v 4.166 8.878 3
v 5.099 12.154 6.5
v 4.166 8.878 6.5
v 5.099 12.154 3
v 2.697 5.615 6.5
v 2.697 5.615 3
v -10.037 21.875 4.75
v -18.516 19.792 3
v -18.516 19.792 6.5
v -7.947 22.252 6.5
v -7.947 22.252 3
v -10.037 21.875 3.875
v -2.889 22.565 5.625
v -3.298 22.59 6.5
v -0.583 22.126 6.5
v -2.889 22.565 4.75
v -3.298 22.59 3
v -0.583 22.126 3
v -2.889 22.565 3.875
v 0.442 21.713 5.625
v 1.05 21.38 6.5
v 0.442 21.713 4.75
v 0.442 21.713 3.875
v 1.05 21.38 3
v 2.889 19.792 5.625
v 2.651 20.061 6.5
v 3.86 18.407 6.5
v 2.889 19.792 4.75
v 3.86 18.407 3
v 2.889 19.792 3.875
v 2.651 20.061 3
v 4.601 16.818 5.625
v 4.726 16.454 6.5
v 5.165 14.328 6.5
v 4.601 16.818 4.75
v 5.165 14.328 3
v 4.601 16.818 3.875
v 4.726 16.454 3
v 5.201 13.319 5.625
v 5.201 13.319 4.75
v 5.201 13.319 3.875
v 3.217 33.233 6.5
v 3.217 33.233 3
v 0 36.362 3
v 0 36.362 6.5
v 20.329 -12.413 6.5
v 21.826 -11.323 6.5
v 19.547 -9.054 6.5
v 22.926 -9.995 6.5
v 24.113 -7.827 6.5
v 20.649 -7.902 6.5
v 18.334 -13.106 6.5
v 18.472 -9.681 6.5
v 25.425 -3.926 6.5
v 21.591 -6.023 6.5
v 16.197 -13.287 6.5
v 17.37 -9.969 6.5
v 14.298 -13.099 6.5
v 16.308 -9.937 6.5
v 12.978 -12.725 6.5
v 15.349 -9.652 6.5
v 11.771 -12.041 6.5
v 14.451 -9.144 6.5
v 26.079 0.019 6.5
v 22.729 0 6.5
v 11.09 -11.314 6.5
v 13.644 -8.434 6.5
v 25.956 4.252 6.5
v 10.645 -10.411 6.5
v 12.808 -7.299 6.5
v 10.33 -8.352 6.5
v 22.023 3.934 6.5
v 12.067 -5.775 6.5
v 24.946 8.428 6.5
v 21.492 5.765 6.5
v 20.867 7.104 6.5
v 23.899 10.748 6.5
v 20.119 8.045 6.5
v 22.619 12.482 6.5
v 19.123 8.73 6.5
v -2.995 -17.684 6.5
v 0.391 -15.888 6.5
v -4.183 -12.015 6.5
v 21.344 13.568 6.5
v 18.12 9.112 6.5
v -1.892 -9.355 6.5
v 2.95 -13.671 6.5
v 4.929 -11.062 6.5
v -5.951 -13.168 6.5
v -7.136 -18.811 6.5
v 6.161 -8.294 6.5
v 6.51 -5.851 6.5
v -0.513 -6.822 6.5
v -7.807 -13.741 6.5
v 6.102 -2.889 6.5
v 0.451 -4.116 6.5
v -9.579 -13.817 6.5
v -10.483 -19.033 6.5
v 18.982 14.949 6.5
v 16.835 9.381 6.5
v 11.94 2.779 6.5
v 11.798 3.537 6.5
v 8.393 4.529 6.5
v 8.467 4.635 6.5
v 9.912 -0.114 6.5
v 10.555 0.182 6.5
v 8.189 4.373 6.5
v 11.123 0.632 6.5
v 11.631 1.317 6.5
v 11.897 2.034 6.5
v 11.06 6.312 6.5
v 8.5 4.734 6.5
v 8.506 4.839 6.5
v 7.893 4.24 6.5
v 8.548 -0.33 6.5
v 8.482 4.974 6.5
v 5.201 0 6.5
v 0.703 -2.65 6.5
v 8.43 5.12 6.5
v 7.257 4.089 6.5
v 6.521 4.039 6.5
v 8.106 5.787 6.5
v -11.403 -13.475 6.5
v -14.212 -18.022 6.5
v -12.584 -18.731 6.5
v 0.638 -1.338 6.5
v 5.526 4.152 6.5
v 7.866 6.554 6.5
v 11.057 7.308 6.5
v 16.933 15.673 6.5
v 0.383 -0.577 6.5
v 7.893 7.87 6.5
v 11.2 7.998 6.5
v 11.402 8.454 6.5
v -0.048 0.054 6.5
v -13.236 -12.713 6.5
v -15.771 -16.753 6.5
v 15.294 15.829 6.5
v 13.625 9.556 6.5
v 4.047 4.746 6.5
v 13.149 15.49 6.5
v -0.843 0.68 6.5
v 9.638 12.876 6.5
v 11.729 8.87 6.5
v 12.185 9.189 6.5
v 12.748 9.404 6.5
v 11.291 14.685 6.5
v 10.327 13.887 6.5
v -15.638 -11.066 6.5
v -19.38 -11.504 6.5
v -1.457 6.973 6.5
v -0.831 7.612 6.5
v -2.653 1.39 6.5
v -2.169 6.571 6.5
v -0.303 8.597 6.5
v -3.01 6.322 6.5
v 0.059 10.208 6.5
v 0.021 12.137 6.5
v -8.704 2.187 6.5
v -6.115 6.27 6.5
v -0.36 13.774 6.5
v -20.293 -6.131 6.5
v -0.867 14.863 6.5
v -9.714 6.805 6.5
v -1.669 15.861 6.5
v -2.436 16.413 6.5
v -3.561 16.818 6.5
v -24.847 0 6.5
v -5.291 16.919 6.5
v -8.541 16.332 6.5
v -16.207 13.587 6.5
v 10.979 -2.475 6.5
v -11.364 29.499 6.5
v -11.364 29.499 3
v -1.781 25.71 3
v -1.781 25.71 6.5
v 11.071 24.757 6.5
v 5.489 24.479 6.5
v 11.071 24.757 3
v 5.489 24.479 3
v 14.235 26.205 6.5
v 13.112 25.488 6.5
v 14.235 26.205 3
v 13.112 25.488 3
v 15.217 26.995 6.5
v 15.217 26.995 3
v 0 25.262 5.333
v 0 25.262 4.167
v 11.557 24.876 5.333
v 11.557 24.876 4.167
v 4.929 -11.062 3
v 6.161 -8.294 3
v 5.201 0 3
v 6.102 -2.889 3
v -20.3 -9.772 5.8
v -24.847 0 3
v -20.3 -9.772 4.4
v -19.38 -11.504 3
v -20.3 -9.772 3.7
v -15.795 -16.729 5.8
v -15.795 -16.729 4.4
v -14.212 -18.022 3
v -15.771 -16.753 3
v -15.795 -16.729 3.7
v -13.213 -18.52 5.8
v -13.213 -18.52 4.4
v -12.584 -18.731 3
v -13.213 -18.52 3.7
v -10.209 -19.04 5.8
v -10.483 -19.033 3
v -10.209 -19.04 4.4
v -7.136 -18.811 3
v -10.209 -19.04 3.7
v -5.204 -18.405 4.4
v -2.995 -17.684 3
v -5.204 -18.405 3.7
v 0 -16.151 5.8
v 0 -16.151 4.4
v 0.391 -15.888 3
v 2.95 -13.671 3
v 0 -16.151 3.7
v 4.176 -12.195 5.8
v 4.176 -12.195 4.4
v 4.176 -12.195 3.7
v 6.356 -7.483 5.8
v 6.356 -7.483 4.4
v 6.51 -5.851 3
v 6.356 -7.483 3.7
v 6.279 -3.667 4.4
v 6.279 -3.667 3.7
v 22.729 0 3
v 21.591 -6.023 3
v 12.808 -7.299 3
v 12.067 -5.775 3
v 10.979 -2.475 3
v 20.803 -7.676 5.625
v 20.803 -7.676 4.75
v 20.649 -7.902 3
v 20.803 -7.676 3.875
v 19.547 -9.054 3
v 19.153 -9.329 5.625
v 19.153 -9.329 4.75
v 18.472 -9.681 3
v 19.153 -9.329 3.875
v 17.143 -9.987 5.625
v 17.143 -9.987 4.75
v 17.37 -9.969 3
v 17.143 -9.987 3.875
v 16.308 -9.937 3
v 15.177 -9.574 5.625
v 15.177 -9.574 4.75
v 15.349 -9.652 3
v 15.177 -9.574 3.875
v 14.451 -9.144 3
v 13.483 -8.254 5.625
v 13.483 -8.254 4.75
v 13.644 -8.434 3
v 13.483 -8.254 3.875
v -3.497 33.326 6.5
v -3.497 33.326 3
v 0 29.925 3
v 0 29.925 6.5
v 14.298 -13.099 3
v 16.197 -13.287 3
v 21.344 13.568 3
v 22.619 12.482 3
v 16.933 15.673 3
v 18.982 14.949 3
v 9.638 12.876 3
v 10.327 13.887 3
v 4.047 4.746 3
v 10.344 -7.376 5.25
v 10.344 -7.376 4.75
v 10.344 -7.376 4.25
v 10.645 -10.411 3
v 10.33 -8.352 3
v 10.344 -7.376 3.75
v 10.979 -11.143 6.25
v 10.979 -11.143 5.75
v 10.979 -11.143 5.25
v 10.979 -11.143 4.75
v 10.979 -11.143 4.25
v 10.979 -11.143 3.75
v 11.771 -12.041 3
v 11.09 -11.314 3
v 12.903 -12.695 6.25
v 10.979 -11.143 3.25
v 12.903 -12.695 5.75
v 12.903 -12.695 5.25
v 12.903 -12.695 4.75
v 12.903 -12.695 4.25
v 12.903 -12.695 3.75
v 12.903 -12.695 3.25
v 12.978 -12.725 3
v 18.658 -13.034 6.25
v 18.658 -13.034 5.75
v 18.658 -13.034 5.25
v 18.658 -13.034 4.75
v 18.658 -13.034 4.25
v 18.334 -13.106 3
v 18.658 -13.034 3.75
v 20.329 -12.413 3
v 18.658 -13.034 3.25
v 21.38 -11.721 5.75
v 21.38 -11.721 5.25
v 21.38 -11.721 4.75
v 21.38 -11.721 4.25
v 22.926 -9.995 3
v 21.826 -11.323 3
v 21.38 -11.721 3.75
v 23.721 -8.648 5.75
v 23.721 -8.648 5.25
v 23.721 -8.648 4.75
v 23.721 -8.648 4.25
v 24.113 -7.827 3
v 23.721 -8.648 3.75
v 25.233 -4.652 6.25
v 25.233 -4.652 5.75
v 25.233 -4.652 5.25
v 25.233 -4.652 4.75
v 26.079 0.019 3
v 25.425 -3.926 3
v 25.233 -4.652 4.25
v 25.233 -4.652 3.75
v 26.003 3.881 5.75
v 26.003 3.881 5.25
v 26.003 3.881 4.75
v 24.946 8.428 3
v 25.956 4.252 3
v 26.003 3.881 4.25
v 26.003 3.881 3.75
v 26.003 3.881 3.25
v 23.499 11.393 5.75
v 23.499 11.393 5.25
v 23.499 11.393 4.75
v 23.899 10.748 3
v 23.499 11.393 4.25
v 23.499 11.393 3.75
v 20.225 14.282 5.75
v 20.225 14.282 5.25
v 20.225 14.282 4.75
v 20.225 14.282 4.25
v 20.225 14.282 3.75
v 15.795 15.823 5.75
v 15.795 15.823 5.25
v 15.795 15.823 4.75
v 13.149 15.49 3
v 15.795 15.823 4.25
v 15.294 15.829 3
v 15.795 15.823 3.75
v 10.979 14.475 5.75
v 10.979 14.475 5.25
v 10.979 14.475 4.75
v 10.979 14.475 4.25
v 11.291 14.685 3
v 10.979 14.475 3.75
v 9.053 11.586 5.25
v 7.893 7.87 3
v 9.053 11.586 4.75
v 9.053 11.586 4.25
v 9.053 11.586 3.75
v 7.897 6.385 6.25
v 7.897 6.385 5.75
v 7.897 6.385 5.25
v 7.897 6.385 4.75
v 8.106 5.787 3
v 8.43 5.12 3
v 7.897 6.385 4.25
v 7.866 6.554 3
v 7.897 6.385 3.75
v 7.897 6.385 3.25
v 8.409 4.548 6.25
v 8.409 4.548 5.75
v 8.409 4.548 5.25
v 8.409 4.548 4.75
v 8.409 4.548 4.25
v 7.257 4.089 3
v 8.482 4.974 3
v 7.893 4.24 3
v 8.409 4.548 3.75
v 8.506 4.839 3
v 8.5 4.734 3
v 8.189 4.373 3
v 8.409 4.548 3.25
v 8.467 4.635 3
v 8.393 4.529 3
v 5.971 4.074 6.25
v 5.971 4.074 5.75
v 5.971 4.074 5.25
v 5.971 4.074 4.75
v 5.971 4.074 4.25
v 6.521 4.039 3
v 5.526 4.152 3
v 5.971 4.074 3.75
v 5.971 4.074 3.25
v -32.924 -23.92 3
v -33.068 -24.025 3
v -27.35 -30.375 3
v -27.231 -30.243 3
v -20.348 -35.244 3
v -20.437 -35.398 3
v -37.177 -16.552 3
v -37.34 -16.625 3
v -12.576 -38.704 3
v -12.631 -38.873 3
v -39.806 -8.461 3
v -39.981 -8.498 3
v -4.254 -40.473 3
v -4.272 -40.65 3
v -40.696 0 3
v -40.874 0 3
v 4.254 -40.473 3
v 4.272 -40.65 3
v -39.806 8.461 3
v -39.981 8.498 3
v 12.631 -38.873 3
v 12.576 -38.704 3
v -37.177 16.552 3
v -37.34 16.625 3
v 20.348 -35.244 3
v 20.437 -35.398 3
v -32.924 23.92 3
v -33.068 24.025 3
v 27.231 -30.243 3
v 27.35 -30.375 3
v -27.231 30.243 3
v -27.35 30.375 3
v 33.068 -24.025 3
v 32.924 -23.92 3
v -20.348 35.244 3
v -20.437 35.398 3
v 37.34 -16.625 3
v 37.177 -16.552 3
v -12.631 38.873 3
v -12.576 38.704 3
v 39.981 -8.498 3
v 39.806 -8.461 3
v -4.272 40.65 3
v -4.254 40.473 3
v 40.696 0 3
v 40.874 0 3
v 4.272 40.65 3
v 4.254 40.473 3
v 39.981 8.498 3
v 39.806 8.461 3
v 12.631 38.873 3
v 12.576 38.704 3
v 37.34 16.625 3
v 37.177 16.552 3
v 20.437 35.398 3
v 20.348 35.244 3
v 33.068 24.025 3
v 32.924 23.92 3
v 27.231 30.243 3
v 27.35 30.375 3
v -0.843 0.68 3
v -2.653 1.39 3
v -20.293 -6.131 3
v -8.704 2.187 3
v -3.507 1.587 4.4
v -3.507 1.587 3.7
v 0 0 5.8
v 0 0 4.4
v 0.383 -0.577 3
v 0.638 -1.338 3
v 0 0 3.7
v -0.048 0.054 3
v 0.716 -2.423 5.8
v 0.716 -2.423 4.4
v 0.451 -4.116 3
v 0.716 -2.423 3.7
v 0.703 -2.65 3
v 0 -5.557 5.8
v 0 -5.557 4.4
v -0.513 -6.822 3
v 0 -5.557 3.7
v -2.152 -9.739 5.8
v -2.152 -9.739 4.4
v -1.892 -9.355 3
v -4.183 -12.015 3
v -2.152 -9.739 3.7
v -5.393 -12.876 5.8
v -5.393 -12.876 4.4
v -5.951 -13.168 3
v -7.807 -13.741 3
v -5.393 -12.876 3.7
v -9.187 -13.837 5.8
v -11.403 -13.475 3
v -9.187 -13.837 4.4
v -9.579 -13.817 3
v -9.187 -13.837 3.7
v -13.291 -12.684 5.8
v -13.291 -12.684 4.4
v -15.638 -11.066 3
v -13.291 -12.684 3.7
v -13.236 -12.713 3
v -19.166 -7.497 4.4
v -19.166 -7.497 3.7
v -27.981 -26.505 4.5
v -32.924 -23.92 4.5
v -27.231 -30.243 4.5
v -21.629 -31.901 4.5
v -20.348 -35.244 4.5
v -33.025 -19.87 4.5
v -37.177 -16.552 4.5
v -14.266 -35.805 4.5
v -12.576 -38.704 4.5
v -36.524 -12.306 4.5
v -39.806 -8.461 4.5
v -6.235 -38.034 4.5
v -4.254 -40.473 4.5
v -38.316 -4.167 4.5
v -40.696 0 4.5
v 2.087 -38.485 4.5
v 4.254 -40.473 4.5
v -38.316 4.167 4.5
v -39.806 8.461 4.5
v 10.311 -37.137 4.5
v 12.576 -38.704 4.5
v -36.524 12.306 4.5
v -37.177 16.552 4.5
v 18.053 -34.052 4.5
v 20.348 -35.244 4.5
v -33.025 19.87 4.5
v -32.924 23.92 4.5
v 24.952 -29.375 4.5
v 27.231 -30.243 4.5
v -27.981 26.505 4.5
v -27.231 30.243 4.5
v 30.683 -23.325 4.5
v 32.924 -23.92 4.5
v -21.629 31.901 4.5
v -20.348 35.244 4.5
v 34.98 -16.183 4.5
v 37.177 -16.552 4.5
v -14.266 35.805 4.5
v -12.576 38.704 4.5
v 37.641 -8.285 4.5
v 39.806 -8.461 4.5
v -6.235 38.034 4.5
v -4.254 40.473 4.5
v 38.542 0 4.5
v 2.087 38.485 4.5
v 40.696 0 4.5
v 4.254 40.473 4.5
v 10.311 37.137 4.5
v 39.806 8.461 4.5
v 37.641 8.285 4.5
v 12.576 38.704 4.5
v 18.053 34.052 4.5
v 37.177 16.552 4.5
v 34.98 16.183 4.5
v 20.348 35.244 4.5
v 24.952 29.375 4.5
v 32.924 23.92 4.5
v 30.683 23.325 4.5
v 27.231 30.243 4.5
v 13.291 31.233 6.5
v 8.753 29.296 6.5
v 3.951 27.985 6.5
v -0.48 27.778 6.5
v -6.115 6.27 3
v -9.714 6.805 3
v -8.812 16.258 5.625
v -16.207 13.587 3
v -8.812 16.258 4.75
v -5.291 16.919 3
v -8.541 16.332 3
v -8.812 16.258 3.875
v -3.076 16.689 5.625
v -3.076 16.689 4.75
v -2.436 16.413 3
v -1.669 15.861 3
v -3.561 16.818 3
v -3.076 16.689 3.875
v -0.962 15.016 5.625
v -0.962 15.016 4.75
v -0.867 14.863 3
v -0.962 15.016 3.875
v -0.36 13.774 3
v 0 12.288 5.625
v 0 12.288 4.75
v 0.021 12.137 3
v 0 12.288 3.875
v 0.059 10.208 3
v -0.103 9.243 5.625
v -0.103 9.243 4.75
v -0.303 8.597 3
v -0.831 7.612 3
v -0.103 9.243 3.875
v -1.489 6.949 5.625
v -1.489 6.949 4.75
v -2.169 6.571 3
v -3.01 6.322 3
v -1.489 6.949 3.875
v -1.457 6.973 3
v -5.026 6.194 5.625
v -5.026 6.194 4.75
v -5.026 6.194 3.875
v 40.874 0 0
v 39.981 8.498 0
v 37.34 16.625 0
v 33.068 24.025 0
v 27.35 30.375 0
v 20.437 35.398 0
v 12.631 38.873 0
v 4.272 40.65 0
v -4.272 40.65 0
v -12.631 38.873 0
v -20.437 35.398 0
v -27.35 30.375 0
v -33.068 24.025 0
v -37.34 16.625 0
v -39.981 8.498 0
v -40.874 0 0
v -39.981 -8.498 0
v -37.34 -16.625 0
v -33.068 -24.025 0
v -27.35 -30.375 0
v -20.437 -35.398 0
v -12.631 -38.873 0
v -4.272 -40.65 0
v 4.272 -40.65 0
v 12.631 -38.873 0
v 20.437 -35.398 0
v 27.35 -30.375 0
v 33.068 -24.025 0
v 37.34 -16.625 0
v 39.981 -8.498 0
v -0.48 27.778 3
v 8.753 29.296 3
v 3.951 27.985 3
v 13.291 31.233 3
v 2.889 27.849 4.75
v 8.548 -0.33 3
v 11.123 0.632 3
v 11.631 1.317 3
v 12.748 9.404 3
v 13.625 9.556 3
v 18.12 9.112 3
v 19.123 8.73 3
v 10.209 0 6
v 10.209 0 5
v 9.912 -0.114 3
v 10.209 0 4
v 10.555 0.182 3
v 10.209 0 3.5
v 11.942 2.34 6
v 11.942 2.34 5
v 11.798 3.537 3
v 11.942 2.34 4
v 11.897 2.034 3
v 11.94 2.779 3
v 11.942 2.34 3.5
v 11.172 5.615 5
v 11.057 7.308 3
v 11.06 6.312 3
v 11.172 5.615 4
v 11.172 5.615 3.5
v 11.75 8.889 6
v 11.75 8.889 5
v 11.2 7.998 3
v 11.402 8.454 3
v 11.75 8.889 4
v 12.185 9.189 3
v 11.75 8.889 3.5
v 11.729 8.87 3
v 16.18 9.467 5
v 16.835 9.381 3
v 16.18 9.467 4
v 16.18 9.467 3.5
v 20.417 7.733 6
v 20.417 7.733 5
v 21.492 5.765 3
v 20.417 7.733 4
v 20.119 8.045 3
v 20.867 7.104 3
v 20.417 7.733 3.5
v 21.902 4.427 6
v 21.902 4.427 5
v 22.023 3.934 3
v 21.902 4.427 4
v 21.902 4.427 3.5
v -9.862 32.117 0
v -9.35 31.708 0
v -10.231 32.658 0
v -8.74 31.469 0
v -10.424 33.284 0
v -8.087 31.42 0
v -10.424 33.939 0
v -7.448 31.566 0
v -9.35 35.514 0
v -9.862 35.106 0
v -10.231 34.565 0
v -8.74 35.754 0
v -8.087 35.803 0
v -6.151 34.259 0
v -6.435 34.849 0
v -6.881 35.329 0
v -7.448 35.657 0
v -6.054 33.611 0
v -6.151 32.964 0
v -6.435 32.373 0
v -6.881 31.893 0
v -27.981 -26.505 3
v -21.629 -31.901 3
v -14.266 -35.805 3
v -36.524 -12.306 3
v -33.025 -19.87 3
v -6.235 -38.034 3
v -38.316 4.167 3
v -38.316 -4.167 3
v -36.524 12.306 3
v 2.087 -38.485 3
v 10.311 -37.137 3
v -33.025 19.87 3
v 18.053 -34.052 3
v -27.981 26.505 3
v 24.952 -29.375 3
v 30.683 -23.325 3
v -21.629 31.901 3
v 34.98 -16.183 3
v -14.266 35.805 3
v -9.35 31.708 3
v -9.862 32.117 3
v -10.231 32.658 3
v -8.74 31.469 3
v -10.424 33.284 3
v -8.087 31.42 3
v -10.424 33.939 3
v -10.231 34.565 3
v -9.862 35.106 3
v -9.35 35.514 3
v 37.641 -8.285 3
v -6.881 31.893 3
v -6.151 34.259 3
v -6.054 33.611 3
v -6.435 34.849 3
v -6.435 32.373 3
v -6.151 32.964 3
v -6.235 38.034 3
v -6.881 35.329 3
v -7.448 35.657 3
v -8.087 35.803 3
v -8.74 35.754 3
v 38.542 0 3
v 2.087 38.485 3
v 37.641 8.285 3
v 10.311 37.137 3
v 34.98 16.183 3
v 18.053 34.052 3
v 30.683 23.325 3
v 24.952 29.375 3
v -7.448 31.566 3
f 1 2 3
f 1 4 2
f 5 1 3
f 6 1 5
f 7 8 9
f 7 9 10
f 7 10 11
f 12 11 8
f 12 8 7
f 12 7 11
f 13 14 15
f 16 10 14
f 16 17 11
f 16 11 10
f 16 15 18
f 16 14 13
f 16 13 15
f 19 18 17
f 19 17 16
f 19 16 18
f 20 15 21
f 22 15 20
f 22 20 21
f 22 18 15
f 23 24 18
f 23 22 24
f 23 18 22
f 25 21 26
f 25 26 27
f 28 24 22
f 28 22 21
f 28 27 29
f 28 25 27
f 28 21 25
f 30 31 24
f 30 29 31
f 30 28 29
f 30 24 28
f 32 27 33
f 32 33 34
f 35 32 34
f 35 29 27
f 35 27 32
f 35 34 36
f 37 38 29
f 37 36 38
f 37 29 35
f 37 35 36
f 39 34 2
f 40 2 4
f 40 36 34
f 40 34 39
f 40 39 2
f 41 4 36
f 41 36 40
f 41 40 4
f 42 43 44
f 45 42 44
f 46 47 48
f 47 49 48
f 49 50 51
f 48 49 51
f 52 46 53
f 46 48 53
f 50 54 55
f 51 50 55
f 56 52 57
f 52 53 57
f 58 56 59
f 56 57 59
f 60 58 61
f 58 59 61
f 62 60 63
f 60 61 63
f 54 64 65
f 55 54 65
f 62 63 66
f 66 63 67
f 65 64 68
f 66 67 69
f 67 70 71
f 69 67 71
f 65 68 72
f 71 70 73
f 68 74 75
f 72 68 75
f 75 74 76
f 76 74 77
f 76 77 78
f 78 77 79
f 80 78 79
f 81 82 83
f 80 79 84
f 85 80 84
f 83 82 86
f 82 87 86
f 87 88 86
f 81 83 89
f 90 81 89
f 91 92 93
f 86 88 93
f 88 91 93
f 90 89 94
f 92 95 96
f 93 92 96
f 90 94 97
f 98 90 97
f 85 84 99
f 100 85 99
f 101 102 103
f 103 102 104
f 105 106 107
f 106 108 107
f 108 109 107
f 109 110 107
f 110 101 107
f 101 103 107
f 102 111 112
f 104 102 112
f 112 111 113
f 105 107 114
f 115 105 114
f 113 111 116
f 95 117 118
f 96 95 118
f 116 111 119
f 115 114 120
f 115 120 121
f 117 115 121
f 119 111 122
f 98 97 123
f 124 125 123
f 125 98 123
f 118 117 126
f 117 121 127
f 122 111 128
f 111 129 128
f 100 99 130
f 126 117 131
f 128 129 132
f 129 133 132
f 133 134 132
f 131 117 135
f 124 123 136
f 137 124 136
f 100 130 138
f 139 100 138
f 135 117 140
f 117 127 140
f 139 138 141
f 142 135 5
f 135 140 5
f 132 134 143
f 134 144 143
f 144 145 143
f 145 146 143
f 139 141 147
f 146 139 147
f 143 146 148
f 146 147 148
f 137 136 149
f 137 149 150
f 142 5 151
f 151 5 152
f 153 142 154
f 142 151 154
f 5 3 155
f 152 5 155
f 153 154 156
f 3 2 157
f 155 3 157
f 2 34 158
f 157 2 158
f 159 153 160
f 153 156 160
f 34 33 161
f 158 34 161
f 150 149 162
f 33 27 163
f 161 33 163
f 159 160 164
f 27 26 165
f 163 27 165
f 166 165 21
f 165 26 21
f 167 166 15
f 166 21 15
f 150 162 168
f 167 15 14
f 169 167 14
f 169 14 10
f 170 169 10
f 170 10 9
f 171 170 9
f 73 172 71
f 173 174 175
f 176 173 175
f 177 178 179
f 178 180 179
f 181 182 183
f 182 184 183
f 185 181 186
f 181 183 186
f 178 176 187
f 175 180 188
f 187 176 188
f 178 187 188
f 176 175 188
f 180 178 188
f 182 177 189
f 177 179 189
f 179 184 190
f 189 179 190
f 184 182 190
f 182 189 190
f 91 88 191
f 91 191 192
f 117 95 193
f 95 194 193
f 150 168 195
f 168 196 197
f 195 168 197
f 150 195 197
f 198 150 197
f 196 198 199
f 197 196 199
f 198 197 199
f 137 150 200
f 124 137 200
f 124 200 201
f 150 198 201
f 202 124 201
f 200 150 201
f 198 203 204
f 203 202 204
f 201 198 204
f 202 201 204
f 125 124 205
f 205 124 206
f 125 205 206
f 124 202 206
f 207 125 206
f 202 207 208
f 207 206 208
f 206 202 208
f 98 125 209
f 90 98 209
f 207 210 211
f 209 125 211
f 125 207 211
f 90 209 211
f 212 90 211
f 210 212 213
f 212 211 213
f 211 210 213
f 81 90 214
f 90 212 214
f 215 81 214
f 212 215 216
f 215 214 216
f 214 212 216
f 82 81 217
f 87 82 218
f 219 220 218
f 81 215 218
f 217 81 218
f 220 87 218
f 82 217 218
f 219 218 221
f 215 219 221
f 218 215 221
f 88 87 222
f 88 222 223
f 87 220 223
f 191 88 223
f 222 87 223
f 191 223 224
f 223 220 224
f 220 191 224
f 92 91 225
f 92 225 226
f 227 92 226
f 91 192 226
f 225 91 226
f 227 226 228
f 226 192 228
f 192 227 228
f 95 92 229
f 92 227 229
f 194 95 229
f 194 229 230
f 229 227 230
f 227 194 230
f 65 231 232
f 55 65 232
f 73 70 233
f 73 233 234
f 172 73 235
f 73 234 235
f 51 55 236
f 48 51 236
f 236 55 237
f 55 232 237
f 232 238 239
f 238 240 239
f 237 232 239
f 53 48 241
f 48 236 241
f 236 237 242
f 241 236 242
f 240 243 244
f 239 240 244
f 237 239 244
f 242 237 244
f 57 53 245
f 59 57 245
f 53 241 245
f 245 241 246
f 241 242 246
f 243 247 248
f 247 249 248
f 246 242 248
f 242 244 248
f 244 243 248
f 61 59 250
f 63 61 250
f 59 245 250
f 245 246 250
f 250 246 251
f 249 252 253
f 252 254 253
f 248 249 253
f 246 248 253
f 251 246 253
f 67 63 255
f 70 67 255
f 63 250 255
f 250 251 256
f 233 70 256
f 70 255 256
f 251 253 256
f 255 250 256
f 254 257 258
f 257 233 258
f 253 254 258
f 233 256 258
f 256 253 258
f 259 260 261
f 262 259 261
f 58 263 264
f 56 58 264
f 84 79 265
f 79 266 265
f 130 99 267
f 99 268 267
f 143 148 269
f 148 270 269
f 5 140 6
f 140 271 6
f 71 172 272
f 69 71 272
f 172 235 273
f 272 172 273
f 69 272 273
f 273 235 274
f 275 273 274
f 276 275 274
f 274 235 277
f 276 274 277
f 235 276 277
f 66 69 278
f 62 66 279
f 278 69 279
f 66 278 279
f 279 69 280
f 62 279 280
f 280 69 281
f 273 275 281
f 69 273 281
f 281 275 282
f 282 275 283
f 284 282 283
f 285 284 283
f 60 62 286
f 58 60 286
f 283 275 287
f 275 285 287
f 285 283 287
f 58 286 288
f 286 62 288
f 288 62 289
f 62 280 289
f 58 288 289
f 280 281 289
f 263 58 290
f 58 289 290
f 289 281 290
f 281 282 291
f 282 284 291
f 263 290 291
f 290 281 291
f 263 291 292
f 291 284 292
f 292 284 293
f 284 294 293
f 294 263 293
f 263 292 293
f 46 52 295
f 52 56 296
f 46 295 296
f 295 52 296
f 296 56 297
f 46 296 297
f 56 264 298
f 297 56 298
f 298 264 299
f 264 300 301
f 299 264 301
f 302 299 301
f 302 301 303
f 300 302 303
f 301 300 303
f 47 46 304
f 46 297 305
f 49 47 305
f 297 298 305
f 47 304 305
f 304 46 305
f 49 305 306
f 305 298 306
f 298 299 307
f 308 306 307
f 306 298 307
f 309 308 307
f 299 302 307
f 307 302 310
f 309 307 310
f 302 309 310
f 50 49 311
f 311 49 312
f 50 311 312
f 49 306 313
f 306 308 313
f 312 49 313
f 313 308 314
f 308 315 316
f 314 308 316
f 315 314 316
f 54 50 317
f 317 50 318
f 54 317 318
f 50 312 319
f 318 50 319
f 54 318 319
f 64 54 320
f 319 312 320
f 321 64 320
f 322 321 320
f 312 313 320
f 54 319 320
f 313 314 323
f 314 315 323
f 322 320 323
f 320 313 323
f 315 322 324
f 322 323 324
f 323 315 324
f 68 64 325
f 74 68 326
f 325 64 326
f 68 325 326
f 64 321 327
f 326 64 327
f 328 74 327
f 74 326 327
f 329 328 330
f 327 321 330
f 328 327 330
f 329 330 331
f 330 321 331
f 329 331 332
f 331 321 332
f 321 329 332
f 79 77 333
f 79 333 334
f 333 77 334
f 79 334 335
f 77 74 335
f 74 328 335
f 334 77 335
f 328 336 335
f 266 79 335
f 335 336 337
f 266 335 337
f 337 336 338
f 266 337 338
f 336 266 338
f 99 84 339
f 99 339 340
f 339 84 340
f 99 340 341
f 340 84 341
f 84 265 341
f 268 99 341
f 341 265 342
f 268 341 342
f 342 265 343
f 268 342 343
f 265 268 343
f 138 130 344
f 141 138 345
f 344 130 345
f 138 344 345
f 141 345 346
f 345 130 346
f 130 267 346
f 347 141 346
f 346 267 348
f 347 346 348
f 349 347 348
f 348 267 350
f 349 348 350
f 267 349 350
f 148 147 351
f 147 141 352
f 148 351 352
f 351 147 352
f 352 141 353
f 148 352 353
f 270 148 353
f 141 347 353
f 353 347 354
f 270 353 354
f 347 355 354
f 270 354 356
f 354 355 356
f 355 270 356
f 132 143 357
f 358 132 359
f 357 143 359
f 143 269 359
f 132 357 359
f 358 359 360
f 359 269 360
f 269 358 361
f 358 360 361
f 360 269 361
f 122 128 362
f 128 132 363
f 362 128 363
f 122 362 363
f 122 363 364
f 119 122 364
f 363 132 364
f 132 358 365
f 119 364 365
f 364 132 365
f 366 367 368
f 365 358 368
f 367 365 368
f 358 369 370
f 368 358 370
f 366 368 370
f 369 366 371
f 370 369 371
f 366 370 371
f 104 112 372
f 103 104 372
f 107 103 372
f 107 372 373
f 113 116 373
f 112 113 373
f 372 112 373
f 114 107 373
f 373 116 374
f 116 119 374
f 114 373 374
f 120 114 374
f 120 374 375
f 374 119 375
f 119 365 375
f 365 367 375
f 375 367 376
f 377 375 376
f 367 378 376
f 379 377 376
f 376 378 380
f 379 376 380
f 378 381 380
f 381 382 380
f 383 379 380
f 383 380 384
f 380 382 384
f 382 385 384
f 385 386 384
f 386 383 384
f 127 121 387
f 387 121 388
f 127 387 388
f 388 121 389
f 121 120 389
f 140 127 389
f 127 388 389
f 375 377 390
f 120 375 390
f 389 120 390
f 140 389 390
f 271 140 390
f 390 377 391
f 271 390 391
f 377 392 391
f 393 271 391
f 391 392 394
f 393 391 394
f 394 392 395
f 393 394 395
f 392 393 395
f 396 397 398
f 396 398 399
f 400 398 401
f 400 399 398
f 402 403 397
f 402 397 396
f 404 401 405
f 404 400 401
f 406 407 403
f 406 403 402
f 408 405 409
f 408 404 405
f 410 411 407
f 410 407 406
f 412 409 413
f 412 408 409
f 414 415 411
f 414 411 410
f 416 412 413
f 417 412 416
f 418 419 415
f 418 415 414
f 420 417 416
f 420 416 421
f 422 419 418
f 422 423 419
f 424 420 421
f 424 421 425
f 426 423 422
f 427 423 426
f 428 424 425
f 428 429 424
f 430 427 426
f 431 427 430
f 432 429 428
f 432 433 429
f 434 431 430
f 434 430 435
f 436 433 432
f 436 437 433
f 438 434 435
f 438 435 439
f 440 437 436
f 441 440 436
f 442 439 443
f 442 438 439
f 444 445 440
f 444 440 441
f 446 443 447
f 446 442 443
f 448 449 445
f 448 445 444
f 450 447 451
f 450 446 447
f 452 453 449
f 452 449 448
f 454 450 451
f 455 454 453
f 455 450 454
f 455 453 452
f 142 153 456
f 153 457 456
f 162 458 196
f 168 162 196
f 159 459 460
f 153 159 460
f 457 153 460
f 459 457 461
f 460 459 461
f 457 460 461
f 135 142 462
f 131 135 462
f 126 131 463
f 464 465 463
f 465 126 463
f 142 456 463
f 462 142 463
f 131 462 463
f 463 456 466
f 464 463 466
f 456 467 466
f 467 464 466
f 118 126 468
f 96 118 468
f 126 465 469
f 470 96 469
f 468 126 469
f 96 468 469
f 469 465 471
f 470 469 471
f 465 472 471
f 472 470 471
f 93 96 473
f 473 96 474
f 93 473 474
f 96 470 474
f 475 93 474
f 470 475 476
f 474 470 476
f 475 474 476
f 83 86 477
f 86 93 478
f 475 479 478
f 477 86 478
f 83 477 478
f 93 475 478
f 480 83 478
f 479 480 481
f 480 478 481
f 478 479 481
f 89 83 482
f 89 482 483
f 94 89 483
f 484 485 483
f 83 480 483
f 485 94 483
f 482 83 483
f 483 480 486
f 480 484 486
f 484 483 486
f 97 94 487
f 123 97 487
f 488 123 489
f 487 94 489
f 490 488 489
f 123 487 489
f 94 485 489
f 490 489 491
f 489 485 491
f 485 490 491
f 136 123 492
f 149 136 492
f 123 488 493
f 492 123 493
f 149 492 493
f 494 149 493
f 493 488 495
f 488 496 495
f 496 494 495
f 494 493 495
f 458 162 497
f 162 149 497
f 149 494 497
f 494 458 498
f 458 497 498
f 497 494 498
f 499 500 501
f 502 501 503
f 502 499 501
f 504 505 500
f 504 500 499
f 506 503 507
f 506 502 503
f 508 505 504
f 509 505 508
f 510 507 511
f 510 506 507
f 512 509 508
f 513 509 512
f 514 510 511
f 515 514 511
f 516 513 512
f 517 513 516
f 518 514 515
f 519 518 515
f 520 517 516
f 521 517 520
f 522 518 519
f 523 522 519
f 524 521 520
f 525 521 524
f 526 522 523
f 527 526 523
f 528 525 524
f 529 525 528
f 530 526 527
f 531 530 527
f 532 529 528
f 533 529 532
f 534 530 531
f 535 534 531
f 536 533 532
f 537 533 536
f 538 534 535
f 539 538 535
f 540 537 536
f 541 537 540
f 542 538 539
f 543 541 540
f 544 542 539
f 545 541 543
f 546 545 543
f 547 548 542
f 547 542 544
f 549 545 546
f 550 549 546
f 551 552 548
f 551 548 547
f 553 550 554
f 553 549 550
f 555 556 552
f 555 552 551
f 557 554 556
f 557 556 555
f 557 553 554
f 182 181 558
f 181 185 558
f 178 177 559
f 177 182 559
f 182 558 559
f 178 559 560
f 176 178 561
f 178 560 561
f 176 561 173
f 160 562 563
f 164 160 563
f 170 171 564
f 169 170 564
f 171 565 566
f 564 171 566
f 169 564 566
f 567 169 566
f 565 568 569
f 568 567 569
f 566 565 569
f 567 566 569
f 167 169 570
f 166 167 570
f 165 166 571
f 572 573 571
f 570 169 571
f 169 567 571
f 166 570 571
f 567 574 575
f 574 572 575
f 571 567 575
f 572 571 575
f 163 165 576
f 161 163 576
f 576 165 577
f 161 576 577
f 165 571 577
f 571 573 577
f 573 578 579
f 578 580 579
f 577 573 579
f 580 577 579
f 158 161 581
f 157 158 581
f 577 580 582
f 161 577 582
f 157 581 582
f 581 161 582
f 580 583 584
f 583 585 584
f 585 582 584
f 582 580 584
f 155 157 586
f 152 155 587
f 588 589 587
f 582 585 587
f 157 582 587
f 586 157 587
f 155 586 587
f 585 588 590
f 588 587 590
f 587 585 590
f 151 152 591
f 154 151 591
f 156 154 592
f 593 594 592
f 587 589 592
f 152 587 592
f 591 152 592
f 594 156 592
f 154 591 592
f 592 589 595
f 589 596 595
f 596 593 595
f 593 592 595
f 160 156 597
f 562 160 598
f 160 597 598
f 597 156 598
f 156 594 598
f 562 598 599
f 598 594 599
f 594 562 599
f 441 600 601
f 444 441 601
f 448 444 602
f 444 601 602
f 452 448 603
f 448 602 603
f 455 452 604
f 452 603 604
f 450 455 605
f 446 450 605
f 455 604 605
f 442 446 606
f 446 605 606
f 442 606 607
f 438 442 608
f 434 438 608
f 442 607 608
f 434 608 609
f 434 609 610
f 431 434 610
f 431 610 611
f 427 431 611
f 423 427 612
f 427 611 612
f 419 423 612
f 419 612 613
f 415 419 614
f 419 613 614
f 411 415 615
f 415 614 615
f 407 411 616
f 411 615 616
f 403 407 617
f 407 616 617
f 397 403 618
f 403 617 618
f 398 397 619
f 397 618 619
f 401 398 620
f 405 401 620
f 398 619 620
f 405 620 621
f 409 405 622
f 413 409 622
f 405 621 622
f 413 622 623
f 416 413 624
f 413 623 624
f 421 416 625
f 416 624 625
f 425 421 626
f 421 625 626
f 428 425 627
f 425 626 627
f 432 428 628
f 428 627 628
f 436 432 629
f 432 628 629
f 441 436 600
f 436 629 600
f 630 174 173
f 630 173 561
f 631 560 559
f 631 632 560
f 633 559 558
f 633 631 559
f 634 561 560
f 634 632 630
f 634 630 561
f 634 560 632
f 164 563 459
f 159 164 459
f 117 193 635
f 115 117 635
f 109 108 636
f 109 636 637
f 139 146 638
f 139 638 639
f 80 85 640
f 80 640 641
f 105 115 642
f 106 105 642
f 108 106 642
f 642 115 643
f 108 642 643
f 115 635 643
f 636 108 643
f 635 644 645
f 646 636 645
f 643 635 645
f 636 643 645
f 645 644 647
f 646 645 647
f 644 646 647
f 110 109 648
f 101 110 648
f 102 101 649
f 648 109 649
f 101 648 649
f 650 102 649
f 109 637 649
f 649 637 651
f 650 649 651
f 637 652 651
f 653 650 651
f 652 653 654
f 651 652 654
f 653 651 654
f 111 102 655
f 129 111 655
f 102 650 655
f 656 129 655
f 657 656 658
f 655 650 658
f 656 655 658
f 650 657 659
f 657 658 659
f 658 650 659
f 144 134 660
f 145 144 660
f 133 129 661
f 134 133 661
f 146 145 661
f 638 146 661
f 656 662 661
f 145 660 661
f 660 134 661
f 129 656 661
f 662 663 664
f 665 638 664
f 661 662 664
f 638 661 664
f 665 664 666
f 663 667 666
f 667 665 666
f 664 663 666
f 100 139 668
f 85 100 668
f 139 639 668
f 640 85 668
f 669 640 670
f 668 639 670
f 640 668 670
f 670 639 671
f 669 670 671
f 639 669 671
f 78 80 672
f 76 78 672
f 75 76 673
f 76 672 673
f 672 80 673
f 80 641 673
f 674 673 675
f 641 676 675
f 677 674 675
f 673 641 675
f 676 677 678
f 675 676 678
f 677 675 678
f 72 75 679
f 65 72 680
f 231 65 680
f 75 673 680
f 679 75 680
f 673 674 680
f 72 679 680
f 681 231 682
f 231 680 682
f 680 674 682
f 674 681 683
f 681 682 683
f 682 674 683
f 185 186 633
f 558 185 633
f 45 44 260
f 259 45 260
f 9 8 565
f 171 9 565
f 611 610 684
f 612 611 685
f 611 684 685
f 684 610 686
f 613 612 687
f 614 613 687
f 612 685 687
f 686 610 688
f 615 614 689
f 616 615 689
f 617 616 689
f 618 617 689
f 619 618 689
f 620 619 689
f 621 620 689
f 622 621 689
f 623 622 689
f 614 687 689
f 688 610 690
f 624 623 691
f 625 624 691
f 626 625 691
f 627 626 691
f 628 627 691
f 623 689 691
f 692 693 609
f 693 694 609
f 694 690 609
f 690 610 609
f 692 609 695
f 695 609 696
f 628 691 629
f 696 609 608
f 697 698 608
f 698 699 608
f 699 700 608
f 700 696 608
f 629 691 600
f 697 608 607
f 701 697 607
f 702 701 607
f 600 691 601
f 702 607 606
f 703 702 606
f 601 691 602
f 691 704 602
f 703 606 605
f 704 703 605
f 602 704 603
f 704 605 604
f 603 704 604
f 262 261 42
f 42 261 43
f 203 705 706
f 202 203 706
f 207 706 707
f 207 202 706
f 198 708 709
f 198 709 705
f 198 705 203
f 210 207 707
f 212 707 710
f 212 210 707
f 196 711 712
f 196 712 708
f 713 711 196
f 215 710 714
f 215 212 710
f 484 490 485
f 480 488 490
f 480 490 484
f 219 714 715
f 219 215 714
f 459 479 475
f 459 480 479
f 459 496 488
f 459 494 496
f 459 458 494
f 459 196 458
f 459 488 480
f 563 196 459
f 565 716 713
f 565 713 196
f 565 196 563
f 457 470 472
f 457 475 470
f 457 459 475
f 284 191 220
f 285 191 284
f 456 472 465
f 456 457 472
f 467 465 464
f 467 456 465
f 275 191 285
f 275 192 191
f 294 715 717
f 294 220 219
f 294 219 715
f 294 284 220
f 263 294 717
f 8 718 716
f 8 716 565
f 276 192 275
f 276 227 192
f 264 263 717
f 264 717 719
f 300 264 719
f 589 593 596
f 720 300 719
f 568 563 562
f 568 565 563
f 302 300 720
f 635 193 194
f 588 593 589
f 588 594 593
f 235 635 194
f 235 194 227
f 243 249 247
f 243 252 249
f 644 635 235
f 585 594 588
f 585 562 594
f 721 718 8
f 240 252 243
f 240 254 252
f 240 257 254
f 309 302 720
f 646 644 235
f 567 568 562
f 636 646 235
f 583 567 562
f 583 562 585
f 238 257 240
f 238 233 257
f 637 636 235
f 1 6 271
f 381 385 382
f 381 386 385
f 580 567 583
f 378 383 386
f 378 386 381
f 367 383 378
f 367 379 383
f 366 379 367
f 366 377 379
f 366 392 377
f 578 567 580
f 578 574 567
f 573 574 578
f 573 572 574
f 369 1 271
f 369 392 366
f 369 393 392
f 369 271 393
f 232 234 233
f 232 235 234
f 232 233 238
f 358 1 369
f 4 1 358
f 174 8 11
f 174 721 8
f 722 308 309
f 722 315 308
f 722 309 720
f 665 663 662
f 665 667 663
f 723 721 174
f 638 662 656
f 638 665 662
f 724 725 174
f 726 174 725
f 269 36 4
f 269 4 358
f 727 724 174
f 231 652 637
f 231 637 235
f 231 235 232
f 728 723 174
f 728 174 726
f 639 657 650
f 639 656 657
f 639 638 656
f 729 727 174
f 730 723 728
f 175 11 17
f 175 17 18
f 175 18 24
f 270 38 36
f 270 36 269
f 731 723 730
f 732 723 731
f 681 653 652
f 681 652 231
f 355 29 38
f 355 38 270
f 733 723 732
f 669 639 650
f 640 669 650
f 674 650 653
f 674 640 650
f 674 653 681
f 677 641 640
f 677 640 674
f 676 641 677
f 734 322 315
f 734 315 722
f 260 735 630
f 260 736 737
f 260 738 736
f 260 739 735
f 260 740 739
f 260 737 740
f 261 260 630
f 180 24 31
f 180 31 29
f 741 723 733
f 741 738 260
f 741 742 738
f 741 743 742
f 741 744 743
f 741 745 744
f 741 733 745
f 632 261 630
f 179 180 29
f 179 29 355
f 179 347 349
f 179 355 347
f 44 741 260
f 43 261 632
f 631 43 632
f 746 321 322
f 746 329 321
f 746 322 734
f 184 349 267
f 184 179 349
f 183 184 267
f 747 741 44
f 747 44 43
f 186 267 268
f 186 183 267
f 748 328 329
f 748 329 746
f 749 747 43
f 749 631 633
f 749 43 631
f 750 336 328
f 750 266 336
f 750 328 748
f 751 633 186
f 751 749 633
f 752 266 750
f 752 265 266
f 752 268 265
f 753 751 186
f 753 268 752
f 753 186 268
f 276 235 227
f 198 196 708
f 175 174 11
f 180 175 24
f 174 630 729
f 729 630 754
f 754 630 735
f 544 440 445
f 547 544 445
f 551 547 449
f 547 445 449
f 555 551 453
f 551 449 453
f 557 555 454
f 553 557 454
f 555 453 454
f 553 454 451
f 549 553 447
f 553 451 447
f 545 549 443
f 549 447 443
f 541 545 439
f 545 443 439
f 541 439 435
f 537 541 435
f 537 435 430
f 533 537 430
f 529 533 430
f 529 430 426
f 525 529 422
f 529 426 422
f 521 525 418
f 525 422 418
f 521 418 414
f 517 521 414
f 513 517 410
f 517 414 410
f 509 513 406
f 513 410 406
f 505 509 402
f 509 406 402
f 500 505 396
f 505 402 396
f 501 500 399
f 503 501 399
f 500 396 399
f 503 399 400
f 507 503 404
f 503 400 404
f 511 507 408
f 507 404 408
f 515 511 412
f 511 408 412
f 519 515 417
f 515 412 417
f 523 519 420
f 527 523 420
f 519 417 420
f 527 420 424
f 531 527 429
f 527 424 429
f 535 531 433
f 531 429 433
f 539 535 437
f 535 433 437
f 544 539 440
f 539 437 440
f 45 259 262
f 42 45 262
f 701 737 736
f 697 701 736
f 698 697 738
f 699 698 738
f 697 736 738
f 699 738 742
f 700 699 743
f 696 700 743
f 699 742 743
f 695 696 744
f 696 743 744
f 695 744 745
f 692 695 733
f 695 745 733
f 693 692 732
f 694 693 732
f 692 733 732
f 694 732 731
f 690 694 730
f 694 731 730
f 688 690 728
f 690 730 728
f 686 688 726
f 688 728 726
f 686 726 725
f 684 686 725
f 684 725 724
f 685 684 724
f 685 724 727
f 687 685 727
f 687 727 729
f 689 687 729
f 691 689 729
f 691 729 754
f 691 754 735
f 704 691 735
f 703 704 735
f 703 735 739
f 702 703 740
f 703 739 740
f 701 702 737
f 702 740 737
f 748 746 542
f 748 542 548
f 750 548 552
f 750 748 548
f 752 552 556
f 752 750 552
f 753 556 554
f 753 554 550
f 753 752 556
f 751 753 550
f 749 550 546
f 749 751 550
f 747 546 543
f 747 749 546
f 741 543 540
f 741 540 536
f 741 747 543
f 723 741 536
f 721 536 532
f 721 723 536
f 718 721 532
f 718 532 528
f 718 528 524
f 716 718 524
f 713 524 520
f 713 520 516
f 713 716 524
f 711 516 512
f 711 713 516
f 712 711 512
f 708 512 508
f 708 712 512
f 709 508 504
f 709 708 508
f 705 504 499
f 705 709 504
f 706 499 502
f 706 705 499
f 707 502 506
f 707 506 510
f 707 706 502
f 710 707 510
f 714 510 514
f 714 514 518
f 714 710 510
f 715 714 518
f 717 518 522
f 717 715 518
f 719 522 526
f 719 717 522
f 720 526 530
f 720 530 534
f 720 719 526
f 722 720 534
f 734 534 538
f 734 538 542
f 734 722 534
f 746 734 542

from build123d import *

# Parameters (mm, degrees)
F0_R     = 40.8737100338
F1_DEPTH = 3
F2_R     = 40.6957539797
F2_R_2   = 38.5419315624
F3_DEPTH = 1.5
F5_DEPTH = 3.5
F6_R     = 2.1975710884
F7_DEPTH = 3


with BuildPart() as f1:
    # F0 (on Top) → F1 (new body)
    with BuildSketch(Plane.XY):
        Circle(F0_R)
    extrude(amount=F1_DEPTH)

    # F2 (on face) → F3 (join)
    with BuildSketch(Plane.XY.offset(3)):
        Circle(F2_R)
        Circle(F2_R_2, mode=Mode.SUBTRACT)
    extrude(amount=F3_DEPTH)

    # F4 (on face) → F5 (join)
    with BuildSketch(Plane.XY.offset(3)):
        with BuildLine():
            add(Edge.make_bspline(
                [(-18.5161922127, 19.791925326), (-12.7151925876, 21.3351674452), (-3.2277425118, 23.859117369), (3.4150540296, 20.4339539585), (6.2694455573, 13.0889481493), (3.9197467048, 8.1734523404), (2.6966251899, 5.6147207506)],
                knots=[0, 0, 0, 0, 0.332446594, 0.5437115441, 0.7624818062, 1, 1, 1, 1], degree=3))
            Line((-18.5161922127, 19.791925326), (-16.20740816, 13.5870669037))
            add(Edge.make_bspline(
                [(-16.20740816, 13.5870669037), (-11.0929458702, 15.6161362843), (-2.752055686, 18.9252319275), (0.6709459709, 12.4764702332), (-0.5376493129, 5.2281596847), (-6.4609189943, 6.24601212), (-9.7139514983, 6.8050120026)],
                knots=[0, 0, 0, 0, 0.3275893752, 0.5342471699, 0.7442106849, 1, 1, 1, 1], degree=3))
            Line((-9.7139514983, 6.8050120026), (-8.7038585916, 2.1874438971))
            add(Edge.make_bspline(
                [(-8.7038585916, 2.1874438971), (-5.0516756353, 1.8971066874), (1.4743799313, 1.3783055249), (0.4320748866, -6.0037109711), (-4.6539335606, -14.2800911607), (-14.7593699815, -14.073892468), (-21.0811542832, -5.254384585), (-24.8474739492, 0)],
                knots=[0, 0, 0, 0, 0.1955278639, 0.3493871254, 0.5461884526, 0.7296333955, 1, 1, 1, 1], degree=3))
            add(Edge.make_bspline(
                [(-24.8474739492, 0), (-21.8108523669, -6.8272496265), (-17.0623369266, -17.5033577248), (-10.2515605655, -19.7180403086), (0.7822052269, -17.4220041674), (7.8494428689, -7.7477839242), (6.0306062721, -2.4276731034), (5.2006347105, 0)],
                knots=[0, 0, 0, 0, 0.2707643094, 0.4234075499, 0.6256267457, 0.8291659872, 1, 1, 1, 1], degree=3))
            add(Edge.make_bspline(
                [(5.2006347105, 0), (7.0558782543, -0.288731548), (10.3259106837, -0.7976466868), (12.5781414282, 2.3991075178), (10.8457845725, 5.4428405295), (11.0488135588, 9.7583543287), (16.3784916805, 9.6098216805), (21.4125144717, 8.4677573473), (22.2506321534, 3.0756632517), (22.7286964655, 0)],
                knots=[0, 0, 0, 0, 0.1522720518, 0.2683930901, 0.393191332, 0.517267269, 0.6610905311, 0.8066852357, 1, 1, 1, 1], degree=3))
            add(Edge.make_bspline(
                [(22.7286964655, 0), (22.3751428346, -2.8940459342), (21.760112666, -7.9284322424), (17.1960973157, -10.7354530989), (12.7814342968, -8.5747040819), (11.6223696105, -4.6521009952), (10.9791178256, -2.475154819)],
                knots=[0, 0, 0, 0, 0.2987774731, 0.5197433814, 0.7334696409, 1, 1, 1, 1], degree=3))
            add(Edge.make_bspline(
                [(10.9791178256, -2.475154819), (10.4143752119, -5.868762178), (9.4170665506, -11.8617117622), (15.7194742185, -13.7352738113), (22.208604559, -12.607886853), (25.7160244182, -4.5211657639), (26.6477559678, 3.6676927283), (24.0516080161, 11.6963261383), (20.3404842083, 14.366500869), (15.9475940403, 16.4684038367), (10.5274427232, 14.8383861124), (9.0509264503, 11.7721150129), (7.1117466969, 6.480918156), (9.3180739858, 4.40547596), (5.5607718644, 3.6452011728), (3.704177681, 4.9218811085), (2.6966251899, 5.6147207506)],
                knots=[0, 0, 0, 0, 0.0927466913, 0.1637862563, 0.2408254215, 0.3302072886, 0.4224188469, 0.511065812, 0.5768972077, 0.6451241214, 0.7155702479, 0.7742736226, 0.8469858668, 0.8895704824, 0.9400711601, 1, 1, 1, 1], degree=3))
        make_face()
        with BuildLine():
            add(Edge.make_bspline(
                [(-11.3643482327, 29.4991154224), (-6.404904251, 28.4573434012), (2.8845705426, 26.5060127748), (9.9821642335, 29.7299226682), (13.2905105129, 31.2326587737)],
                knots=[0, 0, 0, 0, 0.5338777586, 1, 1, 1, 1], degree=3))
            add(Edge.make_bspline(
                [(-11.3643482327, 29.4991154224), (-7.7798241077, 27.8488746747), (-0.6953090811, 24.5873105264), (11.6043928769, 23.9693963536), (14.2279842551, 26.1669657789), (15.2166699991, 26.9951075315)],
                knots=[0, 0, 0, 0, 0.3895762705, 0.76996523, 1, 1, 1, 1], degree=3))
            Line((15.2166699991, 26.9951075315), (13.2905105129, 31.2326587737))
        make_face()
        Polygon((0, 36.3618300318), (-3.4969905391, 33.3261489868), (0, 29.9247764051), (3.2172903236, 33.232509843), align=None)
    extrude(amount=F5_DEPTH)

    # F6 (on face) → F7 (cut)
    with BuildSketch(Plane.XY.offset(3)):
        with Locations((-8.2511557266, 33.6113274097)):
            Circle(F6_R)
    extrude(amount=-F7_DEPTH, mode=Mode.SUBTRACT)


solid = f1.part
